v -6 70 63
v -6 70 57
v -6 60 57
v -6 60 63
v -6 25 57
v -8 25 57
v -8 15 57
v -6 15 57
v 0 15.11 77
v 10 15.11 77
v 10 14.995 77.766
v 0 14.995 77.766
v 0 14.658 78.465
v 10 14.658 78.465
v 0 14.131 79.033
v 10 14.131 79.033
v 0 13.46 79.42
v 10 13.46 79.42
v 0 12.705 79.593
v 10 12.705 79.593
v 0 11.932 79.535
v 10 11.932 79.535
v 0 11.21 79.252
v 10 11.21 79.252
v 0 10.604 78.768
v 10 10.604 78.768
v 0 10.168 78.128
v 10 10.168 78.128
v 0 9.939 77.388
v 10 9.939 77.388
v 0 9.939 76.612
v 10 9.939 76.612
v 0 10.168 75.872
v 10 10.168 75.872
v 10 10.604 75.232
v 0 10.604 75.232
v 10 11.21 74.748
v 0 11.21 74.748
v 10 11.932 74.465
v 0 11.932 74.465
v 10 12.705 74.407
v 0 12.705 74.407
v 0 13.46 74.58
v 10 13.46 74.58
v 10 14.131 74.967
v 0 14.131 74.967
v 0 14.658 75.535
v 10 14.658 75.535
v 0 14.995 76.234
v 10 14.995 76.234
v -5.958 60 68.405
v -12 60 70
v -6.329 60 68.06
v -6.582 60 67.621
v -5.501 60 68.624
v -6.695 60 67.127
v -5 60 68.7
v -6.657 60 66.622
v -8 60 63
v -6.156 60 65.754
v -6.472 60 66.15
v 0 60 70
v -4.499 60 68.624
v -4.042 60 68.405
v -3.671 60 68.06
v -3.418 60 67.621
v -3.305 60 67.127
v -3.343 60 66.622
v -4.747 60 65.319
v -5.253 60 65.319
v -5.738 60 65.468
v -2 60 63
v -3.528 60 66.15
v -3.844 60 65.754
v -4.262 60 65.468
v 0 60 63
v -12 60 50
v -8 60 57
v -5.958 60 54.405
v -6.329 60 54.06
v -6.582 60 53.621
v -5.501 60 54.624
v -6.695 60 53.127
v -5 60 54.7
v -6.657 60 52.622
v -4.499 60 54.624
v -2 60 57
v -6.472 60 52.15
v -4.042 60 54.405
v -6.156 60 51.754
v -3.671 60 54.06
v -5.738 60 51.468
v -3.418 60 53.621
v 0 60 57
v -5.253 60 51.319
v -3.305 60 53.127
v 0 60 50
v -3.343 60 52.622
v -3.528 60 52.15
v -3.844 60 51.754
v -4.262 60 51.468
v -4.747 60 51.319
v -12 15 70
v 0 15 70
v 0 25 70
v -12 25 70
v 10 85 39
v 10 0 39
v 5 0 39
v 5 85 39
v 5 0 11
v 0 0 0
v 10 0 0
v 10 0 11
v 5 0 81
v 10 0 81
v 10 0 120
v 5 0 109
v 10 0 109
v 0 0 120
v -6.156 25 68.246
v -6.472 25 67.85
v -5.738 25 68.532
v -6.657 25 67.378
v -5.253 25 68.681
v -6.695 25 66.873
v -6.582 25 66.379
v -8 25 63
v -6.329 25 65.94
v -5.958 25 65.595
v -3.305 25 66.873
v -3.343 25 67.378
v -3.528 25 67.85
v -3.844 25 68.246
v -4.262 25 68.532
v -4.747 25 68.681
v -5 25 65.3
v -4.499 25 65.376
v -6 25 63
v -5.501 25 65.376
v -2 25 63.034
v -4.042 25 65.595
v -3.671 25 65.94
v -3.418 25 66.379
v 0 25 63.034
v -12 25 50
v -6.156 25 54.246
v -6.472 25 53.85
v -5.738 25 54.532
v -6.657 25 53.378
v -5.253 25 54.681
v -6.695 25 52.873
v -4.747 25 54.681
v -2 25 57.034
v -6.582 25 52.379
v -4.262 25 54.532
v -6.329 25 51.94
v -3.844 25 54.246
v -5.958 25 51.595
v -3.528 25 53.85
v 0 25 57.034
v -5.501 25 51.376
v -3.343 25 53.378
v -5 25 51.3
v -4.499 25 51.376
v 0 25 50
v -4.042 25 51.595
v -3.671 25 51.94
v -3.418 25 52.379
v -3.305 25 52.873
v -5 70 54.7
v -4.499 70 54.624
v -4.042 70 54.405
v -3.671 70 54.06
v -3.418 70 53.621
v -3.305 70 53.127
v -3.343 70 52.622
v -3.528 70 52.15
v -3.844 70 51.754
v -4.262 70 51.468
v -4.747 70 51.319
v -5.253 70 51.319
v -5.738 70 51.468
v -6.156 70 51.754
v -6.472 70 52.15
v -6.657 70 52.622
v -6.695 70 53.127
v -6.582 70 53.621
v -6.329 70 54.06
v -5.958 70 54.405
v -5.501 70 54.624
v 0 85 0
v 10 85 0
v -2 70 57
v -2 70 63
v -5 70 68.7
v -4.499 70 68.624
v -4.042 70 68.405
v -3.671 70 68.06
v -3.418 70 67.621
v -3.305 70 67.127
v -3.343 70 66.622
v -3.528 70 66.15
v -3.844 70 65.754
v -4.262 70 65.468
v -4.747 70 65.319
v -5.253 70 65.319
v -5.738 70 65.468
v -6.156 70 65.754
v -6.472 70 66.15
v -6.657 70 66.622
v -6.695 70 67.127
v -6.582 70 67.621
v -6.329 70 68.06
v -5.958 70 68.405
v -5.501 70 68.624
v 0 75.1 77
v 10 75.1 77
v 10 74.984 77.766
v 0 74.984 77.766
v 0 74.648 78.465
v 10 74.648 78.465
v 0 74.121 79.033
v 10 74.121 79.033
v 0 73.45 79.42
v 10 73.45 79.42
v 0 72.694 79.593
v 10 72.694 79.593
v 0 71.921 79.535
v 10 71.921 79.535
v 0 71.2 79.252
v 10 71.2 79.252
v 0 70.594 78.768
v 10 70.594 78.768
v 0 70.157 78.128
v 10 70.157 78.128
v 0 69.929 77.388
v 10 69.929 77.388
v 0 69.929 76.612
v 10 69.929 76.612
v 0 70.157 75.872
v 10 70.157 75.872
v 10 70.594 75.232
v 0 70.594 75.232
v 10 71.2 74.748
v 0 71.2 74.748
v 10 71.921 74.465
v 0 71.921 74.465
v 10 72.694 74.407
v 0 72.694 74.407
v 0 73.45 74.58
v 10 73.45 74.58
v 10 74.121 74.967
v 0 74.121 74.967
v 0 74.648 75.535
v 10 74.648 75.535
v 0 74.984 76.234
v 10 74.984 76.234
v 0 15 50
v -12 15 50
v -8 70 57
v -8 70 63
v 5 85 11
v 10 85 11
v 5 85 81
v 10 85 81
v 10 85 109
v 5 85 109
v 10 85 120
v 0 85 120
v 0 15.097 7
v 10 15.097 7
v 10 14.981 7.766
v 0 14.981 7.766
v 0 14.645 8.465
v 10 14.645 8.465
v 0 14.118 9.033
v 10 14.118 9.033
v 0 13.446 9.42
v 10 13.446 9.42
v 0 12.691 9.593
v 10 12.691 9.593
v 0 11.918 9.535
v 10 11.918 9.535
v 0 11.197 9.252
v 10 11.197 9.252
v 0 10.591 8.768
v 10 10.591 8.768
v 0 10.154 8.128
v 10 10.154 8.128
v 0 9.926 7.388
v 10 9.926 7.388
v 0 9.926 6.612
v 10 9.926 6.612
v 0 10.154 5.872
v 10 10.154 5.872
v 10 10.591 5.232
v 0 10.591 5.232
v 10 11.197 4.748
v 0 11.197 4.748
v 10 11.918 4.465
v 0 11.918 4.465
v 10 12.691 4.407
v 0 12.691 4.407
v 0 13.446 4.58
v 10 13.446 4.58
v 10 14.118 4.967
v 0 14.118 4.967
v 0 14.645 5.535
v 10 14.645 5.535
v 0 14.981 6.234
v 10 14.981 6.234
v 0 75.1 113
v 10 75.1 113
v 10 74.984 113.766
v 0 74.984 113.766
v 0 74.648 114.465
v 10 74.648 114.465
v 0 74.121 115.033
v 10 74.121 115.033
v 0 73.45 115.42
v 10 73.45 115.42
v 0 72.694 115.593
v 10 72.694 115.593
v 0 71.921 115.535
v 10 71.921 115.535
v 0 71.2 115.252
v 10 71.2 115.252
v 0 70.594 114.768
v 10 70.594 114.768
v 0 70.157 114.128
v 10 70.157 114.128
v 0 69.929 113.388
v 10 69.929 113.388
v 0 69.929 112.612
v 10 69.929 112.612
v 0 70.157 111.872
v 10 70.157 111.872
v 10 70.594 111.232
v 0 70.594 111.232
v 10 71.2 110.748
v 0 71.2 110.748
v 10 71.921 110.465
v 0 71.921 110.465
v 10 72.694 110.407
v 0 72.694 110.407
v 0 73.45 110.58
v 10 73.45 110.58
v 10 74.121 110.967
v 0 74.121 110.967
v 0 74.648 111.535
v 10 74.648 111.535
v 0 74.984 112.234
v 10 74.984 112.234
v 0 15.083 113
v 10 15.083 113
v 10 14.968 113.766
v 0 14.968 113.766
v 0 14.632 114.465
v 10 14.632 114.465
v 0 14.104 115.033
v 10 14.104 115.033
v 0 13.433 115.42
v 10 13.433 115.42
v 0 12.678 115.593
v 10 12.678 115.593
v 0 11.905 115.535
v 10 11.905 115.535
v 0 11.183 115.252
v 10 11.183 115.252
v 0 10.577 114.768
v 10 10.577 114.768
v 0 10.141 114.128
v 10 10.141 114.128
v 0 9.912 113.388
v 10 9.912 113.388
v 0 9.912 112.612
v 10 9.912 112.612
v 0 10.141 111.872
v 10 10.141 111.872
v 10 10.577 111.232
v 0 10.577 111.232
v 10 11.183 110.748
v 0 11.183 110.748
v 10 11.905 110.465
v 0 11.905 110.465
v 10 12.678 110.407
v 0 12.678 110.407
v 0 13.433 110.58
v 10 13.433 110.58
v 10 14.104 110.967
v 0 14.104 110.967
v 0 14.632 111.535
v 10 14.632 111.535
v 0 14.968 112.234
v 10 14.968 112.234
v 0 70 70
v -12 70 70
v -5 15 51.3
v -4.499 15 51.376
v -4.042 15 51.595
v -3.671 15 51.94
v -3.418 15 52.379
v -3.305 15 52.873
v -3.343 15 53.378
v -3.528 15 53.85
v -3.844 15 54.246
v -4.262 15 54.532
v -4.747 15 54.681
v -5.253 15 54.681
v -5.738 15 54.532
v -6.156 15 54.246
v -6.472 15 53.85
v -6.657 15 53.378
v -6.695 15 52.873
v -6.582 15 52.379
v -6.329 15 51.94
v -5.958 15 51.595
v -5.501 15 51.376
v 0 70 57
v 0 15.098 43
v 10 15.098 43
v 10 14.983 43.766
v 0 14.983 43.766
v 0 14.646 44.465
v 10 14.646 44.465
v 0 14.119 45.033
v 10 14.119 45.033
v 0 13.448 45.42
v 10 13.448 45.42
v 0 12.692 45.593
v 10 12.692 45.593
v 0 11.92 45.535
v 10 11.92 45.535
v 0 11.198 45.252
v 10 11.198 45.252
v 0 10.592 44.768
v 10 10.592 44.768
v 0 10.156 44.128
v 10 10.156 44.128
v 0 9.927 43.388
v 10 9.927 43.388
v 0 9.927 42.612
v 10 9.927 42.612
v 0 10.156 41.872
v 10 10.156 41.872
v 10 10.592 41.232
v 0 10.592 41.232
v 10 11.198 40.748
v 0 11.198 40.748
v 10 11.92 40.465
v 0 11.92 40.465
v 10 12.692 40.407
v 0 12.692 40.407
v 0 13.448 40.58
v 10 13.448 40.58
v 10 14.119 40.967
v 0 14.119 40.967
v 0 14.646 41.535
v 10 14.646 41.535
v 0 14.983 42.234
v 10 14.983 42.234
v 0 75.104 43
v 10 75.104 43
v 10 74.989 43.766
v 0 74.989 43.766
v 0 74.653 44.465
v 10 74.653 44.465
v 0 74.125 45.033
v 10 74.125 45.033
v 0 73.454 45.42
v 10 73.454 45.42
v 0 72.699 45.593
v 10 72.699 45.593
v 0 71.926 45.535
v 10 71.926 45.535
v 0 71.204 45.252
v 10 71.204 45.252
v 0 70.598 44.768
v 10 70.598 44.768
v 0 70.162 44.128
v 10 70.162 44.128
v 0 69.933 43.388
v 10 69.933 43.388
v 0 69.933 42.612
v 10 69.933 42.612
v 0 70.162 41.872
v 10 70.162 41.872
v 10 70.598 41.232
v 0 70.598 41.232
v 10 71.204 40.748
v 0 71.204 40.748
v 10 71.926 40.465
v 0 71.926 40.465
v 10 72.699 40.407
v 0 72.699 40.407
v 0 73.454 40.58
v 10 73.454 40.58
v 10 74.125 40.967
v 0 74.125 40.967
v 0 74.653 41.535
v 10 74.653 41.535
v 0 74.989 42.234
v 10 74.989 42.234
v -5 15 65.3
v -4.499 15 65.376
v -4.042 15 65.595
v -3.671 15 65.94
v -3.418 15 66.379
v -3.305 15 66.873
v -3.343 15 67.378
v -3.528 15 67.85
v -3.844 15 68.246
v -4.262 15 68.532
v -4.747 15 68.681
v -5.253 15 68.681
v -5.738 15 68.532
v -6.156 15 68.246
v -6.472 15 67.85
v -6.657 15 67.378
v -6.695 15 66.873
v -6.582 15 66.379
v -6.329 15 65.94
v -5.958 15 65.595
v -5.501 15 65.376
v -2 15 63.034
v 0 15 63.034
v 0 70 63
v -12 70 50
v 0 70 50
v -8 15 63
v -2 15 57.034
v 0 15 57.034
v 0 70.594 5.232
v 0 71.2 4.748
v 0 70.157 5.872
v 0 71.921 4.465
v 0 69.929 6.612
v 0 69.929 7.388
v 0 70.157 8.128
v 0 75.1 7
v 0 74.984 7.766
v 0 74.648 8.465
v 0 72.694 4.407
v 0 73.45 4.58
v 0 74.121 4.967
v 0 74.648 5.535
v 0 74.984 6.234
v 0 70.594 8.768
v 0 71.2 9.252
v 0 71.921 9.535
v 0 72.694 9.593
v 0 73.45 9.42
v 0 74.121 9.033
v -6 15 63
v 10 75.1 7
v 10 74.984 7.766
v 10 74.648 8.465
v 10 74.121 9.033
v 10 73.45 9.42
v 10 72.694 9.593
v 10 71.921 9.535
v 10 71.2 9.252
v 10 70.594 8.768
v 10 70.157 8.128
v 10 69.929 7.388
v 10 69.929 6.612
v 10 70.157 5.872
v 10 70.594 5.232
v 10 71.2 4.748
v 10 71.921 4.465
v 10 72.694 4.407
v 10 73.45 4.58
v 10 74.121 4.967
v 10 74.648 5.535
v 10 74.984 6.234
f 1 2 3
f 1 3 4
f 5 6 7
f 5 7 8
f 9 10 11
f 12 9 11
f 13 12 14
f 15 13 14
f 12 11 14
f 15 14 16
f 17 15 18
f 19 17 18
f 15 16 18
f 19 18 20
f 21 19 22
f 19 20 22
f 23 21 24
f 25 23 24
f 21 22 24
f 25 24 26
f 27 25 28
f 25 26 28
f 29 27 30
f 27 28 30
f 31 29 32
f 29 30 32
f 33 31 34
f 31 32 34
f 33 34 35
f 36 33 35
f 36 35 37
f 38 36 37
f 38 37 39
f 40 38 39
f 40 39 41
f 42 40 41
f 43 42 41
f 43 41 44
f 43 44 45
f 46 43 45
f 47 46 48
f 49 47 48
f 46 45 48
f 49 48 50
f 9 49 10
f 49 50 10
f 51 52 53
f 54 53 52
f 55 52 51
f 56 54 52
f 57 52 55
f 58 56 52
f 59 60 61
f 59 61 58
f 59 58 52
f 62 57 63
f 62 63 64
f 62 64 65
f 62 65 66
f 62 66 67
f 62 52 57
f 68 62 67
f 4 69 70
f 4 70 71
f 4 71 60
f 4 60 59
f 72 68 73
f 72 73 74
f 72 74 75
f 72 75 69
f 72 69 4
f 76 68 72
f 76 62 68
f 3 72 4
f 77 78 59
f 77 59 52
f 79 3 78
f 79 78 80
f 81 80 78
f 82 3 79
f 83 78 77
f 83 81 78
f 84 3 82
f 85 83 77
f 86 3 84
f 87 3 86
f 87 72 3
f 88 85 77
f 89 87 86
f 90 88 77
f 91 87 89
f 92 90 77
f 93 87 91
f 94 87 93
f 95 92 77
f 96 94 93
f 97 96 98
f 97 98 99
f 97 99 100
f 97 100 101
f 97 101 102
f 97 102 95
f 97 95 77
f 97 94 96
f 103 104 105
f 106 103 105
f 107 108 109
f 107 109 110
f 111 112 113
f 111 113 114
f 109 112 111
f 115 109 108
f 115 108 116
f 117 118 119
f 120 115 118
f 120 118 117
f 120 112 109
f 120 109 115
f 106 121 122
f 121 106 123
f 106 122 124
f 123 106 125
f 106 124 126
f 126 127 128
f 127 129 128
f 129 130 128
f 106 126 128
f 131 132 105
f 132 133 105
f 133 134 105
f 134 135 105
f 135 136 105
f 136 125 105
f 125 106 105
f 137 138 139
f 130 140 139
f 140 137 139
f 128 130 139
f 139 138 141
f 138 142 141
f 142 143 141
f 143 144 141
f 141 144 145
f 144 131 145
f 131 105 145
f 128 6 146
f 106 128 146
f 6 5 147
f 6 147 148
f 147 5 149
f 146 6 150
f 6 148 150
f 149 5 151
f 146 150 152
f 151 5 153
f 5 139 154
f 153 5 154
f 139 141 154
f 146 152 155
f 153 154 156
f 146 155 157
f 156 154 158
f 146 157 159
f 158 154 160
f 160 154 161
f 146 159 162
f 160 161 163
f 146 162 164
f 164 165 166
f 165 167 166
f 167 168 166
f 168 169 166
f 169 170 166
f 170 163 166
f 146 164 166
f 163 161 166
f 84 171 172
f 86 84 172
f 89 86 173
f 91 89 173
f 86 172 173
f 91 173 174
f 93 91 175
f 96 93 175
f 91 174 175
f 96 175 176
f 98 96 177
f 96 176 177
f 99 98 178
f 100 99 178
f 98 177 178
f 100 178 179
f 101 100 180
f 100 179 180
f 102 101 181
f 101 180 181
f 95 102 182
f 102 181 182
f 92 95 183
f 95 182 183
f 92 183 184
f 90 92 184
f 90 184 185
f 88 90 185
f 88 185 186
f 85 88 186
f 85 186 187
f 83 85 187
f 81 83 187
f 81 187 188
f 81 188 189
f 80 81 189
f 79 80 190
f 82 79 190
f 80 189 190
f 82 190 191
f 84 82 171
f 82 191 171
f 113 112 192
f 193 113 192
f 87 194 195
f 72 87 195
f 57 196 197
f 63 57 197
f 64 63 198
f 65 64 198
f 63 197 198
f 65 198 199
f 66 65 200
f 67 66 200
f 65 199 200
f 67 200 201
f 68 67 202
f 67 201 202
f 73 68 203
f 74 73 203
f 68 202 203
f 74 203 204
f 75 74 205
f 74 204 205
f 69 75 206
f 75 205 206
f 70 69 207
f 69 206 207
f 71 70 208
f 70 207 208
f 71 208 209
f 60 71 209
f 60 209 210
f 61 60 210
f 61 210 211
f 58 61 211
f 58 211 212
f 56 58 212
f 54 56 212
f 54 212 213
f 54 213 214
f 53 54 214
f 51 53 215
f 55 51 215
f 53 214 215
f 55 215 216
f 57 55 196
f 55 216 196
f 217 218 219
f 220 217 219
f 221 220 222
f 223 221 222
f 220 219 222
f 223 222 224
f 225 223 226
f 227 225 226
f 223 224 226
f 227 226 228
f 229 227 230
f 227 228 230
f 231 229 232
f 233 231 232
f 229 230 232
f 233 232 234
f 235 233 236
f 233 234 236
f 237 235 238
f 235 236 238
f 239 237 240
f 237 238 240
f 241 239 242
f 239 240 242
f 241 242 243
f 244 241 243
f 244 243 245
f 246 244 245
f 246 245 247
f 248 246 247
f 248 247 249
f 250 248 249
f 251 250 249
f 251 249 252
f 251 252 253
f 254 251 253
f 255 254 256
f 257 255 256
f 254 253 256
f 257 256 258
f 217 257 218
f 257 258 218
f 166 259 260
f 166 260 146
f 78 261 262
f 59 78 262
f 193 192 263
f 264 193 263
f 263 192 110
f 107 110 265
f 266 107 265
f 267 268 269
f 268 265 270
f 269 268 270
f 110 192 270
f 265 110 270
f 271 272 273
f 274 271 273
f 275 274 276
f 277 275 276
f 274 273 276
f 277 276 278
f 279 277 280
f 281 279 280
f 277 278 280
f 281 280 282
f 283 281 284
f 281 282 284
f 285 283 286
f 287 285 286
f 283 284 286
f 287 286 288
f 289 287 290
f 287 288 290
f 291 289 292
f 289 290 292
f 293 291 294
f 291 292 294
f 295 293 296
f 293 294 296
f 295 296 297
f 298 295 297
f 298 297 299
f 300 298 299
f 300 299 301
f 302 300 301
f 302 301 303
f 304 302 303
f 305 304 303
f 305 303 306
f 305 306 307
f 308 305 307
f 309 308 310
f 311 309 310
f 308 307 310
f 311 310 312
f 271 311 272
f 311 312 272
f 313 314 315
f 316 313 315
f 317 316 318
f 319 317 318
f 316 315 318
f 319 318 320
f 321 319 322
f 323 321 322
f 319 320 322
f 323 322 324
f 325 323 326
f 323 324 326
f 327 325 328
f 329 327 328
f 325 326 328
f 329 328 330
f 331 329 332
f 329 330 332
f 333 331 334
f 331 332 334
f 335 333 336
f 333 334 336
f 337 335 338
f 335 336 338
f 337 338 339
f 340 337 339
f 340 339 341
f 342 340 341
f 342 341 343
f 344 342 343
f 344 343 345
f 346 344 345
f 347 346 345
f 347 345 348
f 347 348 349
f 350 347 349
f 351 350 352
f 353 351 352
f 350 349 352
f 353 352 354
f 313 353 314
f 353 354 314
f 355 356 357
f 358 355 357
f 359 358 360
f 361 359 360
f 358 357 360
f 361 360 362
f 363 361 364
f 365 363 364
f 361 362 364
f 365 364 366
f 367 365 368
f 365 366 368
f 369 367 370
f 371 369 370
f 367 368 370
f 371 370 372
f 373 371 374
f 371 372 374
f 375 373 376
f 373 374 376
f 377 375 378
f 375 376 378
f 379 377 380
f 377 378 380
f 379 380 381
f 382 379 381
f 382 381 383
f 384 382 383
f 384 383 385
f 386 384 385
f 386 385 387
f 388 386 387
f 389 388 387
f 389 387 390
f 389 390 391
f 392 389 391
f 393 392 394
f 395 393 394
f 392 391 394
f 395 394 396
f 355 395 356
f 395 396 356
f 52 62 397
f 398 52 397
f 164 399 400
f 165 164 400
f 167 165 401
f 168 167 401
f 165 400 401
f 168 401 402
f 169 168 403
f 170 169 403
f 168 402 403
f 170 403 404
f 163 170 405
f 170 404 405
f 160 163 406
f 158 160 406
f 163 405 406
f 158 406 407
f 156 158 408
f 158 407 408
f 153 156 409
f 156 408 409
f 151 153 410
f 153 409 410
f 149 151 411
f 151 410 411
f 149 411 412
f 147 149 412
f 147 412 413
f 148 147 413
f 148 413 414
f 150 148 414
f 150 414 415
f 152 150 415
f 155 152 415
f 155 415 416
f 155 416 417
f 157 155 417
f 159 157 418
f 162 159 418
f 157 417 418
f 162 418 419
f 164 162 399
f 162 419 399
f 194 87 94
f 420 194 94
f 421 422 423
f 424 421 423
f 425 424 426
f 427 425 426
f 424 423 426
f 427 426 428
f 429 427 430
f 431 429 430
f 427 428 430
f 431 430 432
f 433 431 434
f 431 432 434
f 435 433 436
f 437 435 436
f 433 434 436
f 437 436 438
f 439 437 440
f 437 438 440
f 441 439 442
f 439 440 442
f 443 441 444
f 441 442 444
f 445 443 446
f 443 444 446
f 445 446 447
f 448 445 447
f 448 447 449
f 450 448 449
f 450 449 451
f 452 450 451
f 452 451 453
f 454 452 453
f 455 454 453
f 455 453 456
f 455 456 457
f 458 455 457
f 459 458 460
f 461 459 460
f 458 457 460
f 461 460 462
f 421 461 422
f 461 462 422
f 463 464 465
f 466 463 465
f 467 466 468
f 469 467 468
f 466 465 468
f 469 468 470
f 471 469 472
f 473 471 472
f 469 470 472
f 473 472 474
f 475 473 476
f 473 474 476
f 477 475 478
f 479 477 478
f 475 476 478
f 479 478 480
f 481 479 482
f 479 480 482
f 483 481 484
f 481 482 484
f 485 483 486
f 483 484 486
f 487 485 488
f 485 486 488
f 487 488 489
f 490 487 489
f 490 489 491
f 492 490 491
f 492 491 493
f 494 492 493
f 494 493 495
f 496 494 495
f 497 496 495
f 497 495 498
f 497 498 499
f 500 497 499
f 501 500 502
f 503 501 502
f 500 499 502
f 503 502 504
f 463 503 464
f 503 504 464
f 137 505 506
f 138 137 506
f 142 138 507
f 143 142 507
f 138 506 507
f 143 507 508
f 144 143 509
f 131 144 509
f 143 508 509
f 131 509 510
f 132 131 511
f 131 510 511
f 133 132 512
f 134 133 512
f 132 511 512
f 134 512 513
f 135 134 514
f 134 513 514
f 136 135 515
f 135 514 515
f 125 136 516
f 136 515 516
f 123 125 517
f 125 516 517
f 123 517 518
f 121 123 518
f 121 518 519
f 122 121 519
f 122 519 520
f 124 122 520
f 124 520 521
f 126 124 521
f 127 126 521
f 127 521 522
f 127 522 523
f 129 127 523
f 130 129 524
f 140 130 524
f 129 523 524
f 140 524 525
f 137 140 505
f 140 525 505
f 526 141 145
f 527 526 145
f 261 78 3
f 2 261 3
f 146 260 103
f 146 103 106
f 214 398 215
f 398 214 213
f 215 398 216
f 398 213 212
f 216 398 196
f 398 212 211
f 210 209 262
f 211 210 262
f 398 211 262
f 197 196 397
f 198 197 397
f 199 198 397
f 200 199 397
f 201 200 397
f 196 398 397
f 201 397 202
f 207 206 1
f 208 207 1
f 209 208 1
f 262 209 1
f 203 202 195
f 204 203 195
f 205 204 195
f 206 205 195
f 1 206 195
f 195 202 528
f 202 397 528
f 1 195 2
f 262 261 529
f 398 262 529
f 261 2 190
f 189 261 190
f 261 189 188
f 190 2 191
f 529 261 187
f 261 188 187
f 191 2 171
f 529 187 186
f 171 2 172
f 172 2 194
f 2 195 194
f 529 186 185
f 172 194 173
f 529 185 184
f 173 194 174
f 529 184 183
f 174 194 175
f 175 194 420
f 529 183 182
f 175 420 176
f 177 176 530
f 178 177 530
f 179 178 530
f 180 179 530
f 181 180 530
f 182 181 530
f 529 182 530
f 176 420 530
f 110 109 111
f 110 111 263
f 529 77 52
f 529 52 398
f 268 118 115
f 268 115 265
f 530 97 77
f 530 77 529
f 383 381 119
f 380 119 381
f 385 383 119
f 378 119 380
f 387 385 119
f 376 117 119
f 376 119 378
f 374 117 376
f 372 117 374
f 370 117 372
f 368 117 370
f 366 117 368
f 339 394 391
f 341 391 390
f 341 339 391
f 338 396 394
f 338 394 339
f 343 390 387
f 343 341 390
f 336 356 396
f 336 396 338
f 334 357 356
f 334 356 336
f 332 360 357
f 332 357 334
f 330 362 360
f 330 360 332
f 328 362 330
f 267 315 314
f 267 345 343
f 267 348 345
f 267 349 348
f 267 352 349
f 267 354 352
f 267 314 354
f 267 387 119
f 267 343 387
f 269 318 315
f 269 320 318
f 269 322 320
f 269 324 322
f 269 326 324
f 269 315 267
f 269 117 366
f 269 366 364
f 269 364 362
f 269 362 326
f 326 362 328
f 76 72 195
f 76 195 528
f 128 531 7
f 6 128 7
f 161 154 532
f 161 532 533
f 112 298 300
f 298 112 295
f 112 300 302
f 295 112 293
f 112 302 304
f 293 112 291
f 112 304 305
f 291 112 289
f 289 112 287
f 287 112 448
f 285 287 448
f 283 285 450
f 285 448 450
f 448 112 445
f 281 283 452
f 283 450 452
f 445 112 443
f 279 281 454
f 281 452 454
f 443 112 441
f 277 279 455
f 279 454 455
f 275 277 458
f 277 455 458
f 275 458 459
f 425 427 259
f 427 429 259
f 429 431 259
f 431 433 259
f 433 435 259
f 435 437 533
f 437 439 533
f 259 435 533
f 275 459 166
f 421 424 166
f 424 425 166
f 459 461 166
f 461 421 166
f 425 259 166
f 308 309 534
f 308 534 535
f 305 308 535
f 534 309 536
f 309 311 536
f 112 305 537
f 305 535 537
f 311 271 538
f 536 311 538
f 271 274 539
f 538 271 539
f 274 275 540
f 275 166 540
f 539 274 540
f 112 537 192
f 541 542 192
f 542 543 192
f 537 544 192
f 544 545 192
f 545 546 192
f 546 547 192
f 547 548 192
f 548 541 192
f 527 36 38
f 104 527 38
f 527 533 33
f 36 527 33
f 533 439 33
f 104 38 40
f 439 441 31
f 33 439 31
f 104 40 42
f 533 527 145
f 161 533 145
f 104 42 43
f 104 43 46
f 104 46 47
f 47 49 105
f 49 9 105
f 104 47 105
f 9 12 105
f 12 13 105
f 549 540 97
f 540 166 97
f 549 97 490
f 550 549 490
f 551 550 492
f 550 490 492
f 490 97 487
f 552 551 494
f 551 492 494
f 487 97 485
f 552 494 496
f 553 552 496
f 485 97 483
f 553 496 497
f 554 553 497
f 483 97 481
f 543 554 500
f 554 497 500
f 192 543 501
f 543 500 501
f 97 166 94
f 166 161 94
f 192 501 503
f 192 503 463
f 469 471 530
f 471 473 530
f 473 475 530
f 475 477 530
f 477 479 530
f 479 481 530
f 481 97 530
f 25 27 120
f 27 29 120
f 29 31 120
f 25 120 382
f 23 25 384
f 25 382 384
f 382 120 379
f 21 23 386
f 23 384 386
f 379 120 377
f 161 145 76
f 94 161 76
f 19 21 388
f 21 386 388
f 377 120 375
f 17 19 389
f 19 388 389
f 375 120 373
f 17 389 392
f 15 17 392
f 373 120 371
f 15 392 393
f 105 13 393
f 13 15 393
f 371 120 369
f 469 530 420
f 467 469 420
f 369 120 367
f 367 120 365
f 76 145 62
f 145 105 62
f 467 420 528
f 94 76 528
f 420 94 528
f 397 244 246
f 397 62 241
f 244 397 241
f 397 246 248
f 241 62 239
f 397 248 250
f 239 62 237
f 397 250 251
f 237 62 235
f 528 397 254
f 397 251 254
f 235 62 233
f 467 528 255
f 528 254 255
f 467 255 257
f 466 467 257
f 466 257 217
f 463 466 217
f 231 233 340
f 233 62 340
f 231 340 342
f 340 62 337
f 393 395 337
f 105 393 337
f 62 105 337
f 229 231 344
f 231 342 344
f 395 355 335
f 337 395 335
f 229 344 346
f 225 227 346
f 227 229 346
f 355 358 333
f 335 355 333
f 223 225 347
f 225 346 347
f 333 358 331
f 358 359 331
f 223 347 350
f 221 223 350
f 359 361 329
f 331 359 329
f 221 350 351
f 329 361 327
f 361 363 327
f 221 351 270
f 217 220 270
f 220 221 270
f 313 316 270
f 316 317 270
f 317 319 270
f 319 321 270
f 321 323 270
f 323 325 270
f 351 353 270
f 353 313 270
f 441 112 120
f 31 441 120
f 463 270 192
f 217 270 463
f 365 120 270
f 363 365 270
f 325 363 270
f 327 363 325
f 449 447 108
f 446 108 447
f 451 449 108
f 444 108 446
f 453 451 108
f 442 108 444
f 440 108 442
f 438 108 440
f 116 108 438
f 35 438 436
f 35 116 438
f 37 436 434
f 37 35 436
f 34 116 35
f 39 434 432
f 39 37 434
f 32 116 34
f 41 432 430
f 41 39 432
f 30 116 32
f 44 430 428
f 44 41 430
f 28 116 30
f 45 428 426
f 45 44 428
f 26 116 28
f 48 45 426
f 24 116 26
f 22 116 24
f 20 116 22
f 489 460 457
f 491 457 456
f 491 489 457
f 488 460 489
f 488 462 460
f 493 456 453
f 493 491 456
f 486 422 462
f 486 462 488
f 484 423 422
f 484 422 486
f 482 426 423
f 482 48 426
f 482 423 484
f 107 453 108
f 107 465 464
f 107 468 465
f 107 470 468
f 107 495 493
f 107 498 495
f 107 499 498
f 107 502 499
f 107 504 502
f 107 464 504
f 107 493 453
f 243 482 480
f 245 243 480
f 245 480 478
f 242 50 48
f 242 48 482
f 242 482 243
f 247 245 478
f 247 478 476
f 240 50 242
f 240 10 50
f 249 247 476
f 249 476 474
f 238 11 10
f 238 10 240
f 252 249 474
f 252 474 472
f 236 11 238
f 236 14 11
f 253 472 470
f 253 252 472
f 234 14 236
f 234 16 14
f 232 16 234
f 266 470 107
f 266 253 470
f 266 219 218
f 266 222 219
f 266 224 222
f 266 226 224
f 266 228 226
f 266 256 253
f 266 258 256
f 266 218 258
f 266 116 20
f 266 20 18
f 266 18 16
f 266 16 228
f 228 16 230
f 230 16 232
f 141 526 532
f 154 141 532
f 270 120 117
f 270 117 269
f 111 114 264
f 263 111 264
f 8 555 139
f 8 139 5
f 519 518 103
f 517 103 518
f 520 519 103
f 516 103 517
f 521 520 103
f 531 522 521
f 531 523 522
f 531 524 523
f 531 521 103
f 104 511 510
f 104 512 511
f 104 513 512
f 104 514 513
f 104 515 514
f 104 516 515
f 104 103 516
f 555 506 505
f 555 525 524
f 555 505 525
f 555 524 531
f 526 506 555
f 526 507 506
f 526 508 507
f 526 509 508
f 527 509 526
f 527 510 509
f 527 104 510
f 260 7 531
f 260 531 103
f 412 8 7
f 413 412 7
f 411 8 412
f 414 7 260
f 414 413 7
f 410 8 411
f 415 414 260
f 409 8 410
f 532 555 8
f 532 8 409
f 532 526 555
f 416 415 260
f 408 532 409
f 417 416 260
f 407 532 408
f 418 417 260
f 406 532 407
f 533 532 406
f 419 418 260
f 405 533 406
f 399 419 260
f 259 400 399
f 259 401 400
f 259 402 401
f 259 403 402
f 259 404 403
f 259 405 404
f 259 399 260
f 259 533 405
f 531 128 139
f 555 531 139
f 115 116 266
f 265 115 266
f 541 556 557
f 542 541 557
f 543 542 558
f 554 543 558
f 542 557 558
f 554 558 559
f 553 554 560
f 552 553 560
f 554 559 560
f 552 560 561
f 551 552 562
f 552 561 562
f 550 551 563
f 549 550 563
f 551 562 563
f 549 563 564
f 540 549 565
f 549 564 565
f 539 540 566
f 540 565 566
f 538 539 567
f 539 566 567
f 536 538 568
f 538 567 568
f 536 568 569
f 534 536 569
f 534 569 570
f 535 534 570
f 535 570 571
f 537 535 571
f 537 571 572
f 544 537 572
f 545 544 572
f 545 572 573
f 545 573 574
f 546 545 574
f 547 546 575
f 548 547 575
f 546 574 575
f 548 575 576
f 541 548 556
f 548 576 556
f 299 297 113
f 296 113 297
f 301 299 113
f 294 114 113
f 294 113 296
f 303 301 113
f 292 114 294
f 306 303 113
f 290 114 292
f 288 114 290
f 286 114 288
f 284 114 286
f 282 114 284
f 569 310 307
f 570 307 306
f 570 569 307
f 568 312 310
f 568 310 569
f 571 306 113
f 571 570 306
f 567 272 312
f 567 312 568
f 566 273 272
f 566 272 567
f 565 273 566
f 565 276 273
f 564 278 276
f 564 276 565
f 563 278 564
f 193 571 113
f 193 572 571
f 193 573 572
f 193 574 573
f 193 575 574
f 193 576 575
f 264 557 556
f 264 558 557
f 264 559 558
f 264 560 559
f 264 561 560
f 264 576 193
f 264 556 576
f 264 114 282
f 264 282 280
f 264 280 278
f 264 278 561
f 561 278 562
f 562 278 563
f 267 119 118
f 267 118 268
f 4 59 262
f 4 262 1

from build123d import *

# Parameters (mm, degrees)
SKETCH_W        = 85
SKETCH_H        = 120
PAD_DEPTH       = 10
SKETCH001_R     = 2.6
POCKET_DEPTH    = 10
SKETCH002_W     = 85
SKETCH002_H     = 28
POCKET001_DEPTH = 5
SKETCH003_W     = 10
SKETCH003_H     = 20
PAD001_DEPTH    = 12
SKETCH004_R     = 1.7
SKETCH004_W     = 6
SKETCH004_H     = 2
POCKET002_DEPTH = 10
SKETCH005_R     = 1.7
SKETCH005_W     = 6
SKETCH005_H     = 2
POCKET003_DEPTH = 10


with BuildPart() as part:
    # Sketch → Pad (new body)
    with BuildSketch(Plane.YZ):
        with Locations((42.5, 60)):
            Rectangle(SKETCH_W, SKETCH_H)
    extrude(amount=PAD_DEPTH)

    # Sketch001 (on Face6 of Pad) → Pocket (cut)
    with BuildSketch(Plane.YZ.offset(10)):
        with Locations((12.496559, 7)):
            Circle(SKETCH001_R)
        with Locations((72.499756, 7)):
            Circle(SKETCH001_R)
        with Locations((12.498186, 43)):
            Circle(SKETCH001_R)
        with Locations((72.504387, 43)):
            Circle(SKETCH001_R)
        with Locations((12.483372, 113)):
            Circle(SKETCH001_R)
        with Locations((72.5, 113)):
            Circle(SKETCH001_R)
        with Locations((72.5, 77)):
            Circle(SKETCH001_R)
        with Locations((12.510227, 77)):
            Circle(SKETCH001_R)
    extrude(amount=-POCKET_DEPTH, mode=Mode.SUBTRACT)

    # Sketch002 (on Face5 of Pocket) → Pocket001 (cut)
    with BuildSketch(Plane.YZ.offset(10)):
        with Locations((42.5, 25)):
            Rectangle(SKETCH002_W, SKETCH002_H)
        with Locations((42.5, 95)):
            Rectangle(SKETCH002_W, SKETCH002_H)
    extrude(amount=-POCKET001_DEPTH, mode=Mode.SUBTRACT)

    # Sketch003 (on Face4 of Pocket001) → Pad001 (join)
    with BuildSketch(Plane(origin=(0, 0, 0), x_dir=(0, 1, 0), z_dir=(-1, 0, 0))):
        with Locations((20, -60)):
            Rectangle(SKETCH003_W, SKETCH003_H)
        with Locations((65, -60)):
            Rectangle(SKETCH003_W, SKETCH003_H)
    extrude(amount=PAD001_DEPTH)

    # Sketch004 (on Face28 of Pad001) → Pocket002 (cut)
    with BuildSketch(Plane(origin=(0, 15, 0), x_dir=(0, 0, -1), z_dir=(0, -1, 0))):
        with Locations((-67, -5)):
            Circle(SKETCH004_R)
        with Locations((-53, -5)):
            Circle(SKETCH004_R)
        with Locations((-60.033646, -1)):
            Rectangle(SKETCH004_W, SKETCH004_H)
        with Locations((-60, -6.999858)):
            Rectangle(SKETCH004_W, SKETCH004_H)
    extrude(amount=-POCKET002_DEPTH, mode=Mode.SUBTRACT)

    # Sketch005 (on Face19 of Pocket002) → Pocket003 (cut)
    with BuildSketch(Plane.ZX.offset(70)):
        with Locations((53, -5)):
            Circle(SKETCH005_R)
        with Locations((67, -5)):
            Circle(SKETCH005_R)
        with Locations((60, -1)):
            Rectangle(SKETCH005_W, SKETCH005_H)
        with Locations((60, -7)):
            Rectangle(SKETCH005_W, SKETCH005_H)
    extrude(amount=-POCKET003_DEPTH, mode=Mode.SUBTRACT)


solid = part.part
